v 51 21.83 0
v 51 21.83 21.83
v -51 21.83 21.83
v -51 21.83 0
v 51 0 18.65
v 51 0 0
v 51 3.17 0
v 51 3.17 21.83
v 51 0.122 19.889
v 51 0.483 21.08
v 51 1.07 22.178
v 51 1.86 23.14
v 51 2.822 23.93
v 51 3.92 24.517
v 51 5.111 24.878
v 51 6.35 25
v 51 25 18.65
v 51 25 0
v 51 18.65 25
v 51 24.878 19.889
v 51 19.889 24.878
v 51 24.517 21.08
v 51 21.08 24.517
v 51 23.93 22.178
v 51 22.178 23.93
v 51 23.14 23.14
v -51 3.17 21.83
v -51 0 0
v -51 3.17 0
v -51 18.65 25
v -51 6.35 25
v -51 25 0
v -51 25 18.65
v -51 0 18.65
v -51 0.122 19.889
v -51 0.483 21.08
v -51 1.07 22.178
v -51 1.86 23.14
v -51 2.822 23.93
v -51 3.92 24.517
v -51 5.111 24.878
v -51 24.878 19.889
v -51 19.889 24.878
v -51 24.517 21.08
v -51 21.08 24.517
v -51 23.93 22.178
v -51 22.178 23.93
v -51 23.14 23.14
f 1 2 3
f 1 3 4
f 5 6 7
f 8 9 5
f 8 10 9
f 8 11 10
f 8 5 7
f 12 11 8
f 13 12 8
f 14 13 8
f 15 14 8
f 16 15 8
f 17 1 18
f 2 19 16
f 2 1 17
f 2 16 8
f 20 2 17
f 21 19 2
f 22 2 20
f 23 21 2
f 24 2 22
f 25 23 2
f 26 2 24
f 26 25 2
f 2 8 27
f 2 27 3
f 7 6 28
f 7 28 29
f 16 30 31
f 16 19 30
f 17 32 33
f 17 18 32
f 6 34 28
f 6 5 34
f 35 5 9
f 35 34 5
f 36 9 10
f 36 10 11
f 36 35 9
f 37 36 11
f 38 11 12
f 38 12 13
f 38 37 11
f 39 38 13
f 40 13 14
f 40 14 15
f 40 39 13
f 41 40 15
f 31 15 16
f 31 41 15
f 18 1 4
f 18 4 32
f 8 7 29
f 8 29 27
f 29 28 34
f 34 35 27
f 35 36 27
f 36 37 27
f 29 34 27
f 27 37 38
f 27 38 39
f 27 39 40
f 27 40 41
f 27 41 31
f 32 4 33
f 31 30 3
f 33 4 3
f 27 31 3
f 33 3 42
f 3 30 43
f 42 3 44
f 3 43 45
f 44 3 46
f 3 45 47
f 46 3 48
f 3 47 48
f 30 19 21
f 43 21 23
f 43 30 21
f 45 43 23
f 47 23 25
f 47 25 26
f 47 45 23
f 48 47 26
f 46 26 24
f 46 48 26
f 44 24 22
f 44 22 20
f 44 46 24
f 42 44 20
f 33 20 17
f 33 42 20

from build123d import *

# Parameters (mm, degrees)
F1_DEPTH = 51
F2_R     = 6.35


with BuildPart() as f1:
    # F0 (on Right) → F1 (new body, symmetric)
    with BuildSketch(Plane.YZ):
        Polygon((0, 25), (0, 0), (3.17, 0), (3.17, 21.83), (21.83, 21.83), (21.83, 0), (25, 0), (25, 25), align=None)
    extrude(amount=F1_DEPTH, both=True)

    # F2
    f2_edges = [f1.edges().sort_by_distance(p)[0] for p in [
        (0, 25, 25),
        (0, 0, 25),
    ]]
    fillet(f2_edges, radius=F2_R)


solid = f1.part
